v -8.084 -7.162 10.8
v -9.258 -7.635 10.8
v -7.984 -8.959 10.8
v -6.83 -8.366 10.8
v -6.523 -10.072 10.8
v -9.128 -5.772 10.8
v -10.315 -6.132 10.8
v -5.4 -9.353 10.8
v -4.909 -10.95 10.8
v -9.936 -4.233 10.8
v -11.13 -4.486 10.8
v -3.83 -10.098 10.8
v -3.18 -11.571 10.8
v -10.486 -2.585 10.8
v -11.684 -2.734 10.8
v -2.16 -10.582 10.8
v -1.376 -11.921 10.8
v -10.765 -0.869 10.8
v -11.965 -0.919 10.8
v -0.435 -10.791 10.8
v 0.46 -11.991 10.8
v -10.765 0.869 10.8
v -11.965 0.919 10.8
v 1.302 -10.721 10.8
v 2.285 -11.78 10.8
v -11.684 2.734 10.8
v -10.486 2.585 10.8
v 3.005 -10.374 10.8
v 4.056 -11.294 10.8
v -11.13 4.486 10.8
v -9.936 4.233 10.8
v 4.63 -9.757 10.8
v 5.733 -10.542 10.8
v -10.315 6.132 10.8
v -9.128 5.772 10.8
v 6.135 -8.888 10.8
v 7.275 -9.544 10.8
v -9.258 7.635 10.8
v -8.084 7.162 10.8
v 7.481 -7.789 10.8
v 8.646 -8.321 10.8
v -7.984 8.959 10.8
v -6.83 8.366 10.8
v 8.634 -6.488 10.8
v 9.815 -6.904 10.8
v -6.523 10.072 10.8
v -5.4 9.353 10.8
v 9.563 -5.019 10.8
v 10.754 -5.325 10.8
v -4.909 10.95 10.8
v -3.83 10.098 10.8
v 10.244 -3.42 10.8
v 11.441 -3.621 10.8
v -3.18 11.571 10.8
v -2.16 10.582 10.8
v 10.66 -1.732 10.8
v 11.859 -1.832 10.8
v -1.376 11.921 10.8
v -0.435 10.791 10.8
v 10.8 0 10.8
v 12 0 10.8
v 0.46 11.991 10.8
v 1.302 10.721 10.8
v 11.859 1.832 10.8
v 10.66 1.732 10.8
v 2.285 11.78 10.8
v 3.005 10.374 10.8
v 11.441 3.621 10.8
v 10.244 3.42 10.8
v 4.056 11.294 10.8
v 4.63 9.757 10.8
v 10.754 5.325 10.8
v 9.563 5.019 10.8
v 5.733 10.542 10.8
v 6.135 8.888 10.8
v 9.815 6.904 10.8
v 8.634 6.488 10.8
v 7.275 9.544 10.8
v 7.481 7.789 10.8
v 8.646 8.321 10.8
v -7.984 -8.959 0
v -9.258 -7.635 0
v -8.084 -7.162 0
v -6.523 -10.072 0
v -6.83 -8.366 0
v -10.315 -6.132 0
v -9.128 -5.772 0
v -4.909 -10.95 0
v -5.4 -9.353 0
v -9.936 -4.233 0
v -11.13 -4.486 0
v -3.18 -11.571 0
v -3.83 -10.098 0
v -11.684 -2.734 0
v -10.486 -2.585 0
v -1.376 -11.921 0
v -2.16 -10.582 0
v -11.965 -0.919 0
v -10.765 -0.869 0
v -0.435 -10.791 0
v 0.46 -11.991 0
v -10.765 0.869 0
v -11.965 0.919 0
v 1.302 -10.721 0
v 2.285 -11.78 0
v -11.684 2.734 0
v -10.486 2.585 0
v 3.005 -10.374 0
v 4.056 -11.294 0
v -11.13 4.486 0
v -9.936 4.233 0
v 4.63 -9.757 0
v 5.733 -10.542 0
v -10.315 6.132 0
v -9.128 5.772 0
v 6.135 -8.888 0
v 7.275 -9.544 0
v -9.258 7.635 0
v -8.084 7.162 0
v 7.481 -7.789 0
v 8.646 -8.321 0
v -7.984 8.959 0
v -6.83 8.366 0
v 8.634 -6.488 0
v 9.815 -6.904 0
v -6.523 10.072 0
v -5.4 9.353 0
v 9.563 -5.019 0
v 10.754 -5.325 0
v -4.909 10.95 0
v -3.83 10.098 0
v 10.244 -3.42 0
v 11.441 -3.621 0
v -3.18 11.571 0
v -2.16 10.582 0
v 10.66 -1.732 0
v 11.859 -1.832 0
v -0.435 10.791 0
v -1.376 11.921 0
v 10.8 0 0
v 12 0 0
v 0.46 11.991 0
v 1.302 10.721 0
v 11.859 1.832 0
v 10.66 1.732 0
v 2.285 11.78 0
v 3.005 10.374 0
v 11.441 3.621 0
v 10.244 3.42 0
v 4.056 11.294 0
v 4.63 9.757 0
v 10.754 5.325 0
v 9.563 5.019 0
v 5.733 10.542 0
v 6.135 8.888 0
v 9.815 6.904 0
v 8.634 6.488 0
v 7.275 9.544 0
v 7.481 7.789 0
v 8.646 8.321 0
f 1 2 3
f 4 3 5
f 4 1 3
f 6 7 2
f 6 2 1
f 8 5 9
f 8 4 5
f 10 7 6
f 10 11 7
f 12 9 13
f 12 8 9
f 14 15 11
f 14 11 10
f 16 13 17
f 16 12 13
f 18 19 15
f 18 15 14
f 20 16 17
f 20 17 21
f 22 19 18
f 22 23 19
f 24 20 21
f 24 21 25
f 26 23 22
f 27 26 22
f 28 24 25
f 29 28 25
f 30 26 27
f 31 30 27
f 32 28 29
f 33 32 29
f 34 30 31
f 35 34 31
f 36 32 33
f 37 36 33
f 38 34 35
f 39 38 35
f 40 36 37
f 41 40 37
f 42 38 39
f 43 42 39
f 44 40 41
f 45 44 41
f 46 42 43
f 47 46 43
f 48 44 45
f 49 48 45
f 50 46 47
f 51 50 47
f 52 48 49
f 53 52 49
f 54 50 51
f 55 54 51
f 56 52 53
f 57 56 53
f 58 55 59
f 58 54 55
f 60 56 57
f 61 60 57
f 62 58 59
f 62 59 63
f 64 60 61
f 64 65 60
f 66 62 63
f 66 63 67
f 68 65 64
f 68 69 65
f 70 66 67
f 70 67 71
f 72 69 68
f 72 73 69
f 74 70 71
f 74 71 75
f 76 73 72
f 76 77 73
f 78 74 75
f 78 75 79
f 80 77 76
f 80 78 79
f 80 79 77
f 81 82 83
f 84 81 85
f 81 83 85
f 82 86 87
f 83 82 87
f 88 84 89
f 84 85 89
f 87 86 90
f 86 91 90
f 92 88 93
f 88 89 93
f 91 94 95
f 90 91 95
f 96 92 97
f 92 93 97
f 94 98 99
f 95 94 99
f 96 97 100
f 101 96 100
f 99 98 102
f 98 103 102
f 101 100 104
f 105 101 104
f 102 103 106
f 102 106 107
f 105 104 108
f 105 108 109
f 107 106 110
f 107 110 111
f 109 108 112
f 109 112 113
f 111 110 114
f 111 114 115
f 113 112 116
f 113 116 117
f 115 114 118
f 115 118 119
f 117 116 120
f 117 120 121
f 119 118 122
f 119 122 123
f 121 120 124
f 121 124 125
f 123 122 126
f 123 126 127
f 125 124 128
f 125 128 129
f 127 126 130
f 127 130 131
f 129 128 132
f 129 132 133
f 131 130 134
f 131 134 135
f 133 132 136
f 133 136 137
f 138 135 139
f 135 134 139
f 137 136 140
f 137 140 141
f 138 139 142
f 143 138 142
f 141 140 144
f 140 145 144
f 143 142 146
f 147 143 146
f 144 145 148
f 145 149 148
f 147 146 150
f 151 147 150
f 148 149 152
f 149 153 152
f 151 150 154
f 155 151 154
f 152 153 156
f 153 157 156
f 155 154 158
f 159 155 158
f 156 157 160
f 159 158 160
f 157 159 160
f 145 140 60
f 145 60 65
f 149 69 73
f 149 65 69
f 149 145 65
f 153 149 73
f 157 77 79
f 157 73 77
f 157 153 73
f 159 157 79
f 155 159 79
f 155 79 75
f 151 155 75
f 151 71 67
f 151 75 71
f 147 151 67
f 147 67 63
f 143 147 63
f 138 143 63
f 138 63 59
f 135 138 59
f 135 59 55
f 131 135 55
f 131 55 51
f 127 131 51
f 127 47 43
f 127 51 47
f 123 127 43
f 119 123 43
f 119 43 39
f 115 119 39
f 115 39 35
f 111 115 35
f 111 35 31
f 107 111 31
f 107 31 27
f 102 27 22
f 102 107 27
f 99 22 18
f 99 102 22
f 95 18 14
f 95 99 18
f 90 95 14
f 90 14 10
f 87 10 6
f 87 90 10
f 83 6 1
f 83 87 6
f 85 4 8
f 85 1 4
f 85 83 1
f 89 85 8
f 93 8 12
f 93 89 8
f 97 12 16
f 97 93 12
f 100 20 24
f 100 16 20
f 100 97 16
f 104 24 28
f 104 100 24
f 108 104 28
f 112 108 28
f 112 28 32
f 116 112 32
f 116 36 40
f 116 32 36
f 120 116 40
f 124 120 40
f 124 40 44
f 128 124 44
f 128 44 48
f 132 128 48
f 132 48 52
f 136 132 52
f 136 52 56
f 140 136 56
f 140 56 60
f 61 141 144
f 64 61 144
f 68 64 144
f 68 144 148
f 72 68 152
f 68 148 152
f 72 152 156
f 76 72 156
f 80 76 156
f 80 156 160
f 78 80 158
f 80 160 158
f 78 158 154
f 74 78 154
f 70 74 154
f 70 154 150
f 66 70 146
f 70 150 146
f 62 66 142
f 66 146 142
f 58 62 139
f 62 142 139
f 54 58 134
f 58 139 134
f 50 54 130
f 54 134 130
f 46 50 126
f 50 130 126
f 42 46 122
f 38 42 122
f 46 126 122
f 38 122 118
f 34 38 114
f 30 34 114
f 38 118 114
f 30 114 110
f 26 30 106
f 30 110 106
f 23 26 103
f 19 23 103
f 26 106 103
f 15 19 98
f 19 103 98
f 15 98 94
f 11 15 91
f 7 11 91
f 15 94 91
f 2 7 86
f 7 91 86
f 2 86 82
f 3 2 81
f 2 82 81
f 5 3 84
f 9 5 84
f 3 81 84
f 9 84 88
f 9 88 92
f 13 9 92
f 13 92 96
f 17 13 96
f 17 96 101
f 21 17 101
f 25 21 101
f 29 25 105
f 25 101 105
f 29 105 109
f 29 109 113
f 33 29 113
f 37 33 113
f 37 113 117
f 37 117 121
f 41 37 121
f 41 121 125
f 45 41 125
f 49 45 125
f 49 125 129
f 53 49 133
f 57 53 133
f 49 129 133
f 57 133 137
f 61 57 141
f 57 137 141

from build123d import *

# Parameters (mm, degrees)
SKETCH_1_R      = 10
EXTRUDE_1_DEPTH = 9
SCALE_2_SCALE   = 1.2
SHELL_3_T       = -1.2


with BuildPart() as part:
    # 草图1 → 凸台-拉伸1 (new body)
    with BuildSketch(Plane.XY):
        Circle(SKETCH_1_R)
    extrude(amount=EXTRUDE_1_DEPTH)


with BuildPart() as part_1:
    # 缩放比例2: scaled about (0, 0, 0)
    add(part.part.scale(SCALE_2_SCALE))

    # 抽壳3
    shell_3_openings = [part_1.faces().sort_by_distance(p)[0] for p in [
        (0, 0, 10.8),
        (0, 0, 0),
    ]]
    offset(amount=SHELL_3_T, openings=shell_3_openings, kind=Kind.INTERSECTION)


solid = part_1.part
